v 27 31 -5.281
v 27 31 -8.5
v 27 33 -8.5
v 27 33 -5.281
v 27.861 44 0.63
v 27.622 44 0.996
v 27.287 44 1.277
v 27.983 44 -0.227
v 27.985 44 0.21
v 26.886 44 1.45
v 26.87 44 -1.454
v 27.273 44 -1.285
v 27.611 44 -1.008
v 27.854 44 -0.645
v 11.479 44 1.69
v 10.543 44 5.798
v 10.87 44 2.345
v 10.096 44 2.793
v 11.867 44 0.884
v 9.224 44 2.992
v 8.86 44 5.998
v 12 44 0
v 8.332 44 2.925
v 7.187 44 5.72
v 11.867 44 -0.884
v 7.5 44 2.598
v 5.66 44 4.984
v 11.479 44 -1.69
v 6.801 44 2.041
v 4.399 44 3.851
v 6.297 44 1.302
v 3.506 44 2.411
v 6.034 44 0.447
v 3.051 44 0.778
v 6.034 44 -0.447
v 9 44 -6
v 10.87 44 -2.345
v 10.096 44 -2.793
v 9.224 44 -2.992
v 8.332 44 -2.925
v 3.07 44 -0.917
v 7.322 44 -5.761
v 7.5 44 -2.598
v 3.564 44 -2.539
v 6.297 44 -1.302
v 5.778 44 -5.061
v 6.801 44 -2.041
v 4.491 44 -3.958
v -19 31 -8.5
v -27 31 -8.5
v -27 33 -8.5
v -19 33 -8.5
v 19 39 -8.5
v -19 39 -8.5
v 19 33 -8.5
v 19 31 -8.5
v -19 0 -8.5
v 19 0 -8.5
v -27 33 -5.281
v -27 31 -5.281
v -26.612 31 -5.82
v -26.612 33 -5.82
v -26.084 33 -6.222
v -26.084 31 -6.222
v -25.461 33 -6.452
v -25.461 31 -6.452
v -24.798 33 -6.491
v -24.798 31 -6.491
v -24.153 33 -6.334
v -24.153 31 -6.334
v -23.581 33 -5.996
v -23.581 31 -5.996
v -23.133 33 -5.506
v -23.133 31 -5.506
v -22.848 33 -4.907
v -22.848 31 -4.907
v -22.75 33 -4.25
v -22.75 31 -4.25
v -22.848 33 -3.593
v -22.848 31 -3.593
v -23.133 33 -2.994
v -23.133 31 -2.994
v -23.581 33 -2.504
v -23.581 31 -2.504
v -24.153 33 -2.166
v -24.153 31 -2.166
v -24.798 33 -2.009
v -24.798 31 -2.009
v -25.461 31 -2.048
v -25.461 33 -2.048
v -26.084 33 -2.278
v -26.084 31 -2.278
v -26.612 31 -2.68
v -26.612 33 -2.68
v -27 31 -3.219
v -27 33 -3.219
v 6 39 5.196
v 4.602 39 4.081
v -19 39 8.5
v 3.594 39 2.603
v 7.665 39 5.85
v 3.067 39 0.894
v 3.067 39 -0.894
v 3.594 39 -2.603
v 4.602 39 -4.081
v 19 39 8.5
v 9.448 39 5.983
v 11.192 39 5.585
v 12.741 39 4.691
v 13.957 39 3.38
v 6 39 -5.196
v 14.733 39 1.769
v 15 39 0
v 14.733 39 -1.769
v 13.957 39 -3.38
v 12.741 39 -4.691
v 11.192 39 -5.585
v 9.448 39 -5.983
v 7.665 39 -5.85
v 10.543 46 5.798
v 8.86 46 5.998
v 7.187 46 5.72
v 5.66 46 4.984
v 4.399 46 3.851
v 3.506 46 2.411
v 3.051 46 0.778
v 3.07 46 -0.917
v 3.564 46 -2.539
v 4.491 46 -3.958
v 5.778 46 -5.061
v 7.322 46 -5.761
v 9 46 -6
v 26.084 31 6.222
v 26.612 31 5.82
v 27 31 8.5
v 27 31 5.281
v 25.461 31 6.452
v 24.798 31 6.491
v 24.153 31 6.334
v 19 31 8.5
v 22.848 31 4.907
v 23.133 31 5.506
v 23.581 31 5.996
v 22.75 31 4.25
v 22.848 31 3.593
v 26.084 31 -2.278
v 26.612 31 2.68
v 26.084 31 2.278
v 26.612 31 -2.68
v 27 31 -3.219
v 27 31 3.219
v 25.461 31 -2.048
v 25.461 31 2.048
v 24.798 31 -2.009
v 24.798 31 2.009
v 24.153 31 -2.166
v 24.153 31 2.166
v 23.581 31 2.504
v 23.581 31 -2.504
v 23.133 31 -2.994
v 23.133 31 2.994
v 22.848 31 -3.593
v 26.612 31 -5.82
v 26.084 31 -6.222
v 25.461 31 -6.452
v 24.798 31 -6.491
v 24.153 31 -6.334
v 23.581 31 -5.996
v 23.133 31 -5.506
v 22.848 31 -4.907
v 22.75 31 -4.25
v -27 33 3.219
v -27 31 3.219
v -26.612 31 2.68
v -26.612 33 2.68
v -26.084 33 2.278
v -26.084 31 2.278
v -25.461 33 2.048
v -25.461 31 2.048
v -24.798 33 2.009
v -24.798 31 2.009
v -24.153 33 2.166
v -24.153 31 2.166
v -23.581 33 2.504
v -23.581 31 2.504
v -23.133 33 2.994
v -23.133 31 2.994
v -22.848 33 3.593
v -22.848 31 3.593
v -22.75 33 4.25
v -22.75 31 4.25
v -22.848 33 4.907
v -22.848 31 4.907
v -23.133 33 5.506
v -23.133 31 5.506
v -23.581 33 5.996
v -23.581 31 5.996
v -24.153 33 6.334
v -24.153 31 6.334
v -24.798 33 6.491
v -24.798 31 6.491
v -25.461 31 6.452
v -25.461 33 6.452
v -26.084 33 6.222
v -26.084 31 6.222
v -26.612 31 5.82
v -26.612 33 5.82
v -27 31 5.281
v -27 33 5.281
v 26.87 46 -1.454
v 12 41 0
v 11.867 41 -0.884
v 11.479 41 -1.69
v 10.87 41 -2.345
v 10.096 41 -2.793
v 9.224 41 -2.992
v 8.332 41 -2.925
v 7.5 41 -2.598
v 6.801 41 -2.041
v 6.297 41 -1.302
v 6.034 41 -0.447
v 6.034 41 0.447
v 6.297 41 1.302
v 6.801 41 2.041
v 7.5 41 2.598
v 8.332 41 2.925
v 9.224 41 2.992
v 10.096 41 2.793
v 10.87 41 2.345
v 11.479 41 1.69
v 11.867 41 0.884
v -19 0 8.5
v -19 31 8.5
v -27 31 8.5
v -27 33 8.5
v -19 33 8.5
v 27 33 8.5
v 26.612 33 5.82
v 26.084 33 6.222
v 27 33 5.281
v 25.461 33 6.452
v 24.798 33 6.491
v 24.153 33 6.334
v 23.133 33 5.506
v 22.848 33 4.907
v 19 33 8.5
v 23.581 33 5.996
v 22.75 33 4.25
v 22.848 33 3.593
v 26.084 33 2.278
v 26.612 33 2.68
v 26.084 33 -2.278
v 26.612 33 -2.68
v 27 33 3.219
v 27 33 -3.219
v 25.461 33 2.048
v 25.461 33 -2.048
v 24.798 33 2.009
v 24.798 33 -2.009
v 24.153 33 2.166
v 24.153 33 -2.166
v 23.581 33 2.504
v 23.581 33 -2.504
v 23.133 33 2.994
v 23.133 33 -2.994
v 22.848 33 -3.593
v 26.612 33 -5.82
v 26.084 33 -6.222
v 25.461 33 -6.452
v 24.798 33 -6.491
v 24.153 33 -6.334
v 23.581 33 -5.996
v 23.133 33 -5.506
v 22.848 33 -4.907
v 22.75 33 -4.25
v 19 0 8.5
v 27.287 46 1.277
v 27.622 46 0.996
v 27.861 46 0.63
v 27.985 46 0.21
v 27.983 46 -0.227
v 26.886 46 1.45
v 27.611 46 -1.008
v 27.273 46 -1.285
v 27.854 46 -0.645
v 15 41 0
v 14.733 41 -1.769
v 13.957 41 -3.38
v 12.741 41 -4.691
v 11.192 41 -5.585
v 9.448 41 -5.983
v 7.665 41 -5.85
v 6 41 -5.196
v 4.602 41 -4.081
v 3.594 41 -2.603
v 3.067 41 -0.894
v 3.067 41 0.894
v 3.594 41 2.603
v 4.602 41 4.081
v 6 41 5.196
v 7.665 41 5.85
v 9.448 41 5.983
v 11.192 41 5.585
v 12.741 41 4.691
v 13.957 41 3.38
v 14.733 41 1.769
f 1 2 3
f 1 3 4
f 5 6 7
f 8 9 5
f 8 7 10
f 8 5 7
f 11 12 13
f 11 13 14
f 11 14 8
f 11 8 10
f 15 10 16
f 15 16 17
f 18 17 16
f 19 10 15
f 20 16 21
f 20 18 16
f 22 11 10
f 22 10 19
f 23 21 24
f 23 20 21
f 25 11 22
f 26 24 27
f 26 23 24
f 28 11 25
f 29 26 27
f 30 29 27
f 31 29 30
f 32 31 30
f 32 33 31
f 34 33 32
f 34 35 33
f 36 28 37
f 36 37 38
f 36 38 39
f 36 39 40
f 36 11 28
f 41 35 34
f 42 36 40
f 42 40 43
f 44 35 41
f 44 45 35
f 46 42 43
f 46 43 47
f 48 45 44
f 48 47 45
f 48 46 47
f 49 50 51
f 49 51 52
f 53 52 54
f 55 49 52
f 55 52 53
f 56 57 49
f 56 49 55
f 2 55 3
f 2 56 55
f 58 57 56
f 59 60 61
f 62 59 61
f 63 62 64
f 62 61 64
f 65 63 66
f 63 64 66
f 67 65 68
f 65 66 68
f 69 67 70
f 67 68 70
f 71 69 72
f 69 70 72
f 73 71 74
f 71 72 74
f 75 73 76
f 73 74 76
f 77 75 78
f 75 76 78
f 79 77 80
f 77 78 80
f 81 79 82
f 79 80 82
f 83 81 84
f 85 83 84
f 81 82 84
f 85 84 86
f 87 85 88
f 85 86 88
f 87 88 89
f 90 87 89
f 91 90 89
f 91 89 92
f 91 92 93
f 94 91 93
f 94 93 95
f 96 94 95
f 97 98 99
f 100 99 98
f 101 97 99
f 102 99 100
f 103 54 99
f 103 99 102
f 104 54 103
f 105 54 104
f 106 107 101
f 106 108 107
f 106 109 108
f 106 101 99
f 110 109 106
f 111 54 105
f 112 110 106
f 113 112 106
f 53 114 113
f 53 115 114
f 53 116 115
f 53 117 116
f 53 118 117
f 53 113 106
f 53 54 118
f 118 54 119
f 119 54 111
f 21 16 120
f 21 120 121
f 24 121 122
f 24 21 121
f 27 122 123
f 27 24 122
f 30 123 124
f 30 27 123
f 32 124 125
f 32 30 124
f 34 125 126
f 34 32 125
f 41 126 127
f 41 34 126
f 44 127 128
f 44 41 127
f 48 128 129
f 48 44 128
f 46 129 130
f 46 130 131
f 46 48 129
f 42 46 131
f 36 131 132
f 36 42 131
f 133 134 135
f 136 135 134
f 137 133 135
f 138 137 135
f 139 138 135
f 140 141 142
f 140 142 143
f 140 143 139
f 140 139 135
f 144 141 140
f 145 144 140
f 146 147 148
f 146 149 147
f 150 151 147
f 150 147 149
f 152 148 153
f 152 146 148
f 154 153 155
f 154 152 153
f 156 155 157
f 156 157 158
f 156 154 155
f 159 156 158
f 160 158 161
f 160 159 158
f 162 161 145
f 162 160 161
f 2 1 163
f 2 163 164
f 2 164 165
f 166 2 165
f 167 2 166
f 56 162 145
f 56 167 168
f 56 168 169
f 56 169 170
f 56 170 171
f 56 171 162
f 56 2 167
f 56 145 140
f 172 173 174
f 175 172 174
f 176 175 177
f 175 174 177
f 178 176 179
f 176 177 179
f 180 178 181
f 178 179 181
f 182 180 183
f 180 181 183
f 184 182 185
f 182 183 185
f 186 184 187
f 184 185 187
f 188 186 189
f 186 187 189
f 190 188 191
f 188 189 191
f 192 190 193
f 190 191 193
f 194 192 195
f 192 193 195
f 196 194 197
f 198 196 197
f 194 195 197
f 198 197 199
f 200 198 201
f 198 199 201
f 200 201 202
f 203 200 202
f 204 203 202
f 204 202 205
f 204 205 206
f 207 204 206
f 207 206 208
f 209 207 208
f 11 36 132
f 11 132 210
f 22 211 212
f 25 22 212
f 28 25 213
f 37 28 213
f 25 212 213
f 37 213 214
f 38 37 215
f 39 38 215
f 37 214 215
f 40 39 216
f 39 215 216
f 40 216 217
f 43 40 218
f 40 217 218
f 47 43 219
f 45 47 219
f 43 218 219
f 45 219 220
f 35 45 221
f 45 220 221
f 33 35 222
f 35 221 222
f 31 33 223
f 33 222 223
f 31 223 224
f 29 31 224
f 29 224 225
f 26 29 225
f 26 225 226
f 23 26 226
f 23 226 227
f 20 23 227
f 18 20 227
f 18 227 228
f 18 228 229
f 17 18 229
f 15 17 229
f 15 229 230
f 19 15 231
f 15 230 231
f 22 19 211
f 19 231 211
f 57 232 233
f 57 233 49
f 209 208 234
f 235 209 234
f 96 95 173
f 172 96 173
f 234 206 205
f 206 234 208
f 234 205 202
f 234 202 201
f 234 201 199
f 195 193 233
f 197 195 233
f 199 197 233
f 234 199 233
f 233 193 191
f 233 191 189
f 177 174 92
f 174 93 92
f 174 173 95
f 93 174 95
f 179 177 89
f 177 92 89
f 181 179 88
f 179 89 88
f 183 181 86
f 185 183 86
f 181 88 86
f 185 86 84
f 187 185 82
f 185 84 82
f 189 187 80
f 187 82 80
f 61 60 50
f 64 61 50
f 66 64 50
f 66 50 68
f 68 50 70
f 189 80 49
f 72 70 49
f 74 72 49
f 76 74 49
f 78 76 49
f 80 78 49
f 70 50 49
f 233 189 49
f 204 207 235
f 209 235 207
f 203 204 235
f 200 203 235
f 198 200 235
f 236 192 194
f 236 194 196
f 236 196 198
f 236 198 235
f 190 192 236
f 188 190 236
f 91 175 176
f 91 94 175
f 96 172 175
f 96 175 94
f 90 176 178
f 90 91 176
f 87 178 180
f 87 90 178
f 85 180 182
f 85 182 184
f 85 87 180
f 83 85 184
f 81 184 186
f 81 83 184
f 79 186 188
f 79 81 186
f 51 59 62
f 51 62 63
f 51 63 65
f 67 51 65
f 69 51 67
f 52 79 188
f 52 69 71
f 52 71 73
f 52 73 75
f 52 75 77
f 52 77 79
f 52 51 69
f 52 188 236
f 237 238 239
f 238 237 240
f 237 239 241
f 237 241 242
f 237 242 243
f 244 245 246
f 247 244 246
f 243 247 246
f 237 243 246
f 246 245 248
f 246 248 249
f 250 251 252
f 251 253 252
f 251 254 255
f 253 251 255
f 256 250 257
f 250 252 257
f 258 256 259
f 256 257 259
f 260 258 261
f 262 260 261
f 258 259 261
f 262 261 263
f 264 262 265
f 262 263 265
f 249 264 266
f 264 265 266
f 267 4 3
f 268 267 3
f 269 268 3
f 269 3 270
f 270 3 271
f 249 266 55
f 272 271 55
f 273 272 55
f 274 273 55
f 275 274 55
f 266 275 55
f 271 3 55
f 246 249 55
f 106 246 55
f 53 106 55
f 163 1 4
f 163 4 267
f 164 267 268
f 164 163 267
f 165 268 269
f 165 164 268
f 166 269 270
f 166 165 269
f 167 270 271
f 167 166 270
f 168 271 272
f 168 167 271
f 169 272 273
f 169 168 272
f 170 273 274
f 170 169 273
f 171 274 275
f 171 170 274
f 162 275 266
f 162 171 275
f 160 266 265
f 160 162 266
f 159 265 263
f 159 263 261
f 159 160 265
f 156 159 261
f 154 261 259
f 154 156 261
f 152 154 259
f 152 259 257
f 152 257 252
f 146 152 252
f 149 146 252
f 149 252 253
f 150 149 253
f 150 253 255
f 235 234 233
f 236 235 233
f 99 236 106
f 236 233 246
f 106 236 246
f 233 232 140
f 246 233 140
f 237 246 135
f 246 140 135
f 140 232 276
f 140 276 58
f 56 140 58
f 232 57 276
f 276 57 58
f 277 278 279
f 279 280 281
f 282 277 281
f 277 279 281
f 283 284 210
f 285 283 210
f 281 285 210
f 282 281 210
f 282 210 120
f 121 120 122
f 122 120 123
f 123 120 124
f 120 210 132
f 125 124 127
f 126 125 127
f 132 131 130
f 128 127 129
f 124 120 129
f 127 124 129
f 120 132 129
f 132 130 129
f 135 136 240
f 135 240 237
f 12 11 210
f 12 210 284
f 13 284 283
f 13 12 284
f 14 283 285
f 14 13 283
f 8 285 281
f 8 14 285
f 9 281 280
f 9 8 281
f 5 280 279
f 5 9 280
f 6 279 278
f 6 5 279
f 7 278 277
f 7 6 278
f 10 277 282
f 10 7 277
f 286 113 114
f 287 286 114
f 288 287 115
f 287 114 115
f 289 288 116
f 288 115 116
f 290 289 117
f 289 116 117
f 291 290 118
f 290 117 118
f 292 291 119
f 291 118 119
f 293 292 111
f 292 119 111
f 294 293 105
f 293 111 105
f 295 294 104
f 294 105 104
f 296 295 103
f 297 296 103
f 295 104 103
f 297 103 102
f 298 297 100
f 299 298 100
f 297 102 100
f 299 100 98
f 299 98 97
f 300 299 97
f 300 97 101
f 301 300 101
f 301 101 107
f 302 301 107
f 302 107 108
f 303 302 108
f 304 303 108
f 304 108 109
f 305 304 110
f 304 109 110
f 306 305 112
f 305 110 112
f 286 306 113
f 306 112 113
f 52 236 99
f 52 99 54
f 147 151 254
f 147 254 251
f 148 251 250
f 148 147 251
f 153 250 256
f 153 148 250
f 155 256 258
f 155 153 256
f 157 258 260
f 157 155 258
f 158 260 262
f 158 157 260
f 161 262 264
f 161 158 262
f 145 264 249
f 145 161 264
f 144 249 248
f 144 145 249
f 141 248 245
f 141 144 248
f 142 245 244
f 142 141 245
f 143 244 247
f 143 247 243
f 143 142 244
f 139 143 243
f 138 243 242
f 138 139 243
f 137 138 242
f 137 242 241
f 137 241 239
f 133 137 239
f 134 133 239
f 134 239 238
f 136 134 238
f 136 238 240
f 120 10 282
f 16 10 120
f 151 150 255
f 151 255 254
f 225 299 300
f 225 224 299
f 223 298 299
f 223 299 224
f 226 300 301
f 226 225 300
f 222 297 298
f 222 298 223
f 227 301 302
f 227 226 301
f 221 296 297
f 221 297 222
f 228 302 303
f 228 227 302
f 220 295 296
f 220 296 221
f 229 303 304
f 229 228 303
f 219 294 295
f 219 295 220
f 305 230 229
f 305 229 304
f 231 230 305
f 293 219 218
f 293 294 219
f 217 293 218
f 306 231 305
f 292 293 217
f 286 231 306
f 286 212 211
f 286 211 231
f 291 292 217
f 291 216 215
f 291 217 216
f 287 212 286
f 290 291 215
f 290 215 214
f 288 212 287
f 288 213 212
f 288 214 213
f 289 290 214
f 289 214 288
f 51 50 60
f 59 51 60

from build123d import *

# Parameters (mm, degrees)
SKETCH1_W           = 38
SKETCH1_H           = 17
BOSS_EXTRUDE1_DEPTH = 39
BOSS_EXTRUDE2_DEPTH = 2
SKETCH3_R           = 6
BOSS_EXTRUDE3_DEPTH = 2
SKETCH4_R           = 3
BOSS_EXTRUDE4_DEPTH = 3
BOSS_EXTRUDE5_DEPTH = 2


with BuildPart() as part:
    # Sketch1 → Boss-Extrude1 (new body)
    with BuildSketch(Plane(origin=(0, 0, 0), x_dir=(1, 0, 0), z_dir=(0, 1, 0))):
        Rectangle(SKETCH1_W, SKETCH1_H)
    extrude(amount=BOSS_EXTRUDE1_DEPTH)

    # Sketch2 → Boss-Extrude2 (add)
    with BuildSketch(Plane(origin=(0, 31, 0), x_dir=(1, 0, 0), z_dir=(0, 1, 0))):
        with BuildLine():
            Line((19, 8.5), (27, 8.5))
            Line((27, 8.5), (27, 5.280776406))
            ThreePointArc((27, 5.280776406), (22.75, 4.25), (27, 3.219223594))
            Line((27, 3.219223594), (27, -3.219223594))
            ThreePointArc((27, -3.219223594), (22.75, -4.25), (27, -5.280776406))
            Line((27, -5.280776406), (27, -8.5))
            Line((27, -8.5), (19, -8.5))
            Line((19, -8.5), (19, 8.5))
        make_face()
    boss_extrude2 = extrude(amount=BOSS_EXTRUDE2_DEPTH)

    # Mirror1: Boss-Extrude2 across plane
    add(boss_extrude2.mirror(Plane(origin=(0, 0, 0), x_dir=(0, 0, 1), z_dir=(1, 0, 0))))

    # Sketch3 → Boss-Extrude3 (add)
    with BuildSketch(Plane(origin=(0, 39, 0), x_dir=(1, 0, 0), z_dir=(0, 1, 0))):
        with Locations((9, 0)):
            Circle(SKETCH3_R)
    extrude(amount=BOSS_EXTRUDE3_DEPTH)

    # Sketch4 → Boss-Extrude4 (add)
    with BuildSketch(Plane(origin=(0, 41, 0), x_dir=(1, 0, 0), z_dir=(0, 1, 0))):
        with Locations((9, 0)):
            Circle(SKETCH4_R)
    extrude(amount=BOSS_EXTRUDE4_DEPTH)

    # Sketch5 → Boss-Extrude5 (add)
    with BuildSketch(Plane(origin=(0, 44, 0), x_dir=(1, 0, 0), z_dir=(0, 1, 0))):
        with BuildLine():
            Line((9, 6), (26.869837254, 1.453691991))
            ThreePointArc((26.869837254, 1.453691991), (27.99997757, 0.008202936), (26.885714286, -1.449560102))
            Line((26.885714286, -1.449560102), (10.542857143, -5.798240409))
            ThreePointArc((10.542857143, -5.798240409), (3.050653714, -0.777996641), (9, 6))
        make_face()
    extrude(amount=BOSS_EXTRUDE5_DEPTH)


solid = part.part
